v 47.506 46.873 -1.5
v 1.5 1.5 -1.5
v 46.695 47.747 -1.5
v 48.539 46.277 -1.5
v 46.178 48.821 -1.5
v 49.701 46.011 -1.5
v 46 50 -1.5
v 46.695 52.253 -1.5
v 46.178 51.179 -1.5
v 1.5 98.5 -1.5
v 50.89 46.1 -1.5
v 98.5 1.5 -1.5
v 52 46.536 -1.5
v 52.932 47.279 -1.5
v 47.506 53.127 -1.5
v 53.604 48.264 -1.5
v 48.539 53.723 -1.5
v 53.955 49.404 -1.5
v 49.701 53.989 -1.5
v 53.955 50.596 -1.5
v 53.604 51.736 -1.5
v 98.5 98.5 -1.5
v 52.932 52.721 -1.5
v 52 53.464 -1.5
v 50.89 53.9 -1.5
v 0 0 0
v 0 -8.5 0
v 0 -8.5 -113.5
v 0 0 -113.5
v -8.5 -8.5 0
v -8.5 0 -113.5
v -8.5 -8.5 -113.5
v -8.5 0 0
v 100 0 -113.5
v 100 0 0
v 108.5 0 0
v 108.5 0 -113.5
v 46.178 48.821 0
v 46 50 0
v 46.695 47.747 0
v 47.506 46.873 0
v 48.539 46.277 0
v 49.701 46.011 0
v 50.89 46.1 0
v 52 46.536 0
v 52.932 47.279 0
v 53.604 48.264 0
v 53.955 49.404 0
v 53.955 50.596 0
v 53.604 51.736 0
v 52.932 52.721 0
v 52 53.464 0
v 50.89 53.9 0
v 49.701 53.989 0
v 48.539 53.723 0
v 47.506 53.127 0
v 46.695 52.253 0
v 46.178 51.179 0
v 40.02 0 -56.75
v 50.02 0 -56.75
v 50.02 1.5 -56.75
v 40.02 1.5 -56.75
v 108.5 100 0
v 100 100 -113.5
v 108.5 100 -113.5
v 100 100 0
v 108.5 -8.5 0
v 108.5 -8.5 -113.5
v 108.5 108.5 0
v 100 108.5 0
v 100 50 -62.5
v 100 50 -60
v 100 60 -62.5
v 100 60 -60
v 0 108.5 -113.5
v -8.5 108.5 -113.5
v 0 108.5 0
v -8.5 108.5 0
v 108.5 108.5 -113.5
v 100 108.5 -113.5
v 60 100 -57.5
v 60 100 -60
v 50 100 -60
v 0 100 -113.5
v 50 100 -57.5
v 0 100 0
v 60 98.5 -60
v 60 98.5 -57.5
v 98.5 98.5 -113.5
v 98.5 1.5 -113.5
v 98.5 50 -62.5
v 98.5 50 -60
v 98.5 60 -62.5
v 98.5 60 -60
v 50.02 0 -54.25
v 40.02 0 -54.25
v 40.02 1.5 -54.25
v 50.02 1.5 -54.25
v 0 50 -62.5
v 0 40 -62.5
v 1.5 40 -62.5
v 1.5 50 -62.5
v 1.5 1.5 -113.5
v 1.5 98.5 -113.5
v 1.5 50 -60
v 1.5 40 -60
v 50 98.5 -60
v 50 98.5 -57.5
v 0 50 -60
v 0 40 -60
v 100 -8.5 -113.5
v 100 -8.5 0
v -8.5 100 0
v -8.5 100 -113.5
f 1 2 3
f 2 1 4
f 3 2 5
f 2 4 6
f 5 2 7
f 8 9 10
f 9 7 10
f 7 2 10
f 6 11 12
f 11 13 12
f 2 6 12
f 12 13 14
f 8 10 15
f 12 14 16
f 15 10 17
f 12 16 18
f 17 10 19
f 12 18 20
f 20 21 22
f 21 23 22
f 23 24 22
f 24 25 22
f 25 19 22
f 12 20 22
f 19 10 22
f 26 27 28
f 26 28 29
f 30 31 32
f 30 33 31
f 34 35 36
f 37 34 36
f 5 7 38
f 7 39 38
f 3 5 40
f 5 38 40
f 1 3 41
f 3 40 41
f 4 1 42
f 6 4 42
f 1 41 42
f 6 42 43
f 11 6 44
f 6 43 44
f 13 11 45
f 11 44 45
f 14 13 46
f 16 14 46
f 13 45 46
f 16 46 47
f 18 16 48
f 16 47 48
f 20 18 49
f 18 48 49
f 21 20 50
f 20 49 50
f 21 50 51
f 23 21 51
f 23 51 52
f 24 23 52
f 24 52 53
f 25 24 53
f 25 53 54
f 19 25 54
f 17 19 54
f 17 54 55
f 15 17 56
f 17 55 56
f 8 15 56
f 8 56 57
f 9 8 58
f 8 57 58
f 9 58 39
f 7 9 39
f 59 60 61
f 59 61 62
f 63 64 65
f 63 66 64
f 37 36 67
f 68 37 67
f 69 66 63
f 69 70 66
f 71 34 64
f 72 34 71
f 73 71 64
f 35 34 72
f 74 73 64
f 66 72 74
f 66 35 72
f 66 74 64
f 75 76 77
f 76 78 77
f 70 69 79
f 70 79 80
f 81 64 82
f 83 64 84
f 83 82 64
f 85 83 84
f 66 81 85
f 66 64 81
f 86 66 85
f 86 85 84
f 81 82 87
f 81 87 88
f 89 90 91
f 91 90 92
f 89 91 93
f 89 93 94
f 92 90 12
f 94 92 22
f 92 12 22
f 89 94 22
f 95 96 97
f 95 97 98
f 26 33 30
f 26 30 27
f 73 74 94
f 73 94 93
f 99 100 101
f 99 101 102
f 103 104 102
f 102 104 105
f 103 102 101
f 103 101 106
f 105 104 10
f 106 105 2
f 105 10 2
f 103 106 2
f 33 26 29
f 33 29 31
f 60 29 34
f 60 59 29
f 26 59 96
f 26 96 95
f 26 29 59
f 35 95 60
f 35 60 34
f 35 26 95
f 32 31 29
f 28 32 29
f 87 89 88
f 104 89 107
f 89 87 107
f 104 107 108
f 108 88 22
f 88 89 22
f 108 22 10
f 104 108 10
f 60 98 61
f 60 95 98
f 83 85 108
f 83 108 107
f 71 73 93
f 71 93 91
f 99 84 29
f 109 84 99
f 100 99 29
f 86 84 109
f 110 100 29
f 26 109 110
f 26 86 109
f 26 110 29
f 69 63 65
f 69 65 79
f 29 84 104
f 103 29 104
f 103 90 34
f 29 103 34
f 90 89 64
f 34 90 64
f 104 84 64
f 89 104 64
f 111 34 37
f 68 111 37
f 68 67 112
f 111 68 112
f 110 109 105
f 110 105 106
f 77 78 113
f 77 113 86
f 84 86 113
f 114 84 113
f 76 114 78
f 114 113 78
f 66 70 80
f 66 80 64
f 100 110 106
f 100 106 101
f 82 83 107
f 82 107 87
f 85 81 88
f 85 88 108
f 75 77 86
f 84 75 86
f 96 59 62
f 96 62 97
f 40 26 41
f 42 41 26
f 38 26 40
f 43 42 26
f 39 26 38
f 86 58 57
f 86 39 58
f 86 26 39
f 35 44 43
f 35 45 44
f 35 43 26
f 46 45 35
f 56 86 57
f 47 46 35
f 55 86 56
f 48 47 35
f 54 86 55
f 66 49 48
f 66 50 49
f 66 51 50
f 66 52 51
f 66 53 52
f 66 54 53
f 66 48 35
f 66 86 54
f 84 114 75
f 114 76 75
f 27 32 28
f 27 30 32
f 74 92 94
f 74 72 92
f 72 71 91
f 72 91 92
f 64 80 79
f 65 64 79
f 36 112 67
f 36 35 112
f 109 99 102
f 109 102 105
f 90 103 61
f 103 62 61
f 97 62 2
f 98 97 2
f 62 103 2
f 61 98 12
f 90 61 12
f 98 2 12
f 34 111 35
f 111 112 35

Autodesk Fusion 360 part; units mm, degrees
sketch "Sketch1" plane through (0, 0, 0) normal (0, 0, 1) x (1, 0, 0)
  line L0 (0, 0) -> (100, 0)
  line L1 (100, 0) -> (100, 100)
  line L2 (100, 100) -> (0, 100)
  line L3 (0, 100) -> (0, 0)
  dimension "d1" = 100
  dimension "d2" = 100
extrude "Extrude1" add sketch "Sketch1" against normal blind 113.5
shell "Shell1" thickness 1.5 removed faces 1 at (33.3333, 66.6667, -113.5)
sketch "Sketch2" plane through (0, 0, 0) normal (0, 0, 1) x (1, 0, 0)
  line L0 (0, 0) -> (-8.5, 0)
  line L1 (-8.5, 0) -> (-8.5, -8.5)
  line L2 (-8.5, -8.5) -> (0, -8.5)
  line L3 (0, -8.5) -> (0, 0)
  line L4 (0, 100) -> (-8.5, 100)
  line L5 (-8.5, 100) -> (-8.5, 108.5)
  line L6 (-8.5, 108.5) -> (0, 108.5)
  line L7 (0, 108.5) -> (0, 100)
  line L8 (100, 100) -> (108.5, 100)
  line L9 (108.5, 100) -> (108.5, 108.5)
  line L10 (108.5, 108.5) -> (100, 108.5)
  line L11 (100, 108.5) -> (100, 100)
  line L12 (100, 0) -> (108.5, 0)
  line L13 (108.5, 0) -> (108.5, -8.5)
  line L14 (108.5, -8.5) -> (100, -8.5)
  line L15 (100, -8.5) -> (100, 0)
  dimension "d6" = 8.5
  dimension "d7" = 8.5
  dimension "d8" = 8.5
  dimension "d9" = 8.5
  dimension "d10" = 8.5
  dimension "d11" = 8.5
  dimension "d12" = 8.5
  dimension "d13" = 8.5
extrude "Extrude2" add sketch "Sketch2" against normal blind 113.5
sketch "Sketch3" plane through (100, 0, 0) normal (1, 0, 0) x (0, 1, 0)
  line L0 (100, 0) -> (0, 0)
  line L1 (0, 0) -> (0, -113.5)
  line L2 (0, -113.5) -> (100, -113.5)
  line L3 (100, -113.5) -> (100, 0)
  line L4 (50, -60) -> (60, -60)
  line L5 (60, -60) -> (60, -62.5)
  line L6 (60, -62.5) -> (50, -62.5)
  line L7 (50, -62.5) -> (50, -60)
  dimension "d16" = 10
  dimension "d17" = 2.5
extrude "Extrude3" cut sketch "Sketch3" against normal blind 10 contours L4 L5 L6 L7
sketch "Sketch4" plane through (0, 0, 0) normal (-1, 0, 0) x (0, -1, 0)
  line L0 (0, 0) -> (-100, 0)
  line L1 (-100, 0) -> (-100, -113.5)
  line L2 (-100, -113.5) -> (0, -113.5)
  line L3 (0, -113.5) -> (0, 0)
  line L4 (-50, -60) -> (-40, -60)
  line L5 (-40, -60) -> (-40, -62.5)
  line L6 (-40, -62.5) -> (-50, -62.5)
  line L7 (-50, -62.5) -> (-50, -60)
  dimension "d20" = 10
  dimension "d21" = 2.5
extrude "Extrude4" cut sketch "Sketch4" against normal blind 10 contours L4 L5 L6 L7
sketch "Sketch5" plane through (0, 100, 0) normal (0, 1, 0) x (-1, 0, 0)
  line L0 (0, 0) -> (-100, 0)
  line L1 (-100, 0) -> (-100, -113.5)
  line L2 (-100, -113.5) -> (0, -113.5)
  line L3 (0, -113.5) -> (0, 0)
  line L4 (-50, -60) -> (-60, -60)
  line L5 (-60, -60) -> (-60, -57.5)
  line L6 (-60, -57.5) -> (-50, -57.5)
  line L7 (-50, -57.5) -> (-50, -60)
  dimension "d24" = 10
  dimension "d25" = 2.5
extrude "Extrude5" cut sketch "Sketch5" against normal blind 10 contours L4 L5 L6 L7
sketch "Sketch6" plane through (0, 0, 0) normal (0, -1, 0) x (1, 0, 0)
  line L0 (100, 0) -> (0, 0)
  line L1 (0, 0) -> (0, -113.5)
  line L2 (0, -113.5) -> (100, -113.5)
  line L3 (100, -113.5) -> (100, 0)
  line L4 (50.0197, -56.75) -> (40.0197, -56.75)
  line L5 (40.0197, -56.75) -> (40.0197, -54.25)
  line L6 (40.0197, -54.25) -> (50.0197, -54.25)
  line L7 (50.0197, -54.25) -> (50.0197, -56.75)
  dimension "d28" = 10
  dimension "d29" = 2.5
extrude "Extrude6" cut sketch "Sketch6" against normal blind 10 contours L4 L5 L6 L7
sketch "Sketch7" plane through (0, 0, 0) normal (0, 0, 1) x (-1, 0, 0)
  line L0 (0, -100) -> (0, 0)
  line L1 (0, 0) -> (-100, 0)
  line L2 (-100, 0) -> (-100, -100)
  line L3 (-100, -100) -> (0, -100)
  circle A0 centre (-50, -50) radius 4
  dimension "d32" = 8
extrude "Extrude7" cut sketch "Sketch7" against normal blind 113.5 contours A0
sketch "Sketch8" plane through (0, 0, 0) normal (0, 0, 1) x (-1, 0, 0)
  circle A0 centre (-50, -50) radius 4
  line L0 (0, -100) -> (0, 0)
  line L1 (0, 0) -> (-100, 0)
  line L2 (-100, 0) -> (-100, -100)
  line L3 (-100, -100) -> (0, -100)
  circle A1 centre (-5, -5) radius 1.25
  dimension "d35" = 2.5
sketch "Sketch9" plane through (0, 0, 0) normal (0, 0, 1) x (-1, 0, 0)
  circle A0 centre (-5, -95) radius 1.25
  circle A1 centre (-95, -95) radius 1.25
  circle A2 centre (-95, -5) radius 1.25
  dimension "d36" = 2.5
  dimension "d37" = 2.5
  dimension "d38" = 2.5
